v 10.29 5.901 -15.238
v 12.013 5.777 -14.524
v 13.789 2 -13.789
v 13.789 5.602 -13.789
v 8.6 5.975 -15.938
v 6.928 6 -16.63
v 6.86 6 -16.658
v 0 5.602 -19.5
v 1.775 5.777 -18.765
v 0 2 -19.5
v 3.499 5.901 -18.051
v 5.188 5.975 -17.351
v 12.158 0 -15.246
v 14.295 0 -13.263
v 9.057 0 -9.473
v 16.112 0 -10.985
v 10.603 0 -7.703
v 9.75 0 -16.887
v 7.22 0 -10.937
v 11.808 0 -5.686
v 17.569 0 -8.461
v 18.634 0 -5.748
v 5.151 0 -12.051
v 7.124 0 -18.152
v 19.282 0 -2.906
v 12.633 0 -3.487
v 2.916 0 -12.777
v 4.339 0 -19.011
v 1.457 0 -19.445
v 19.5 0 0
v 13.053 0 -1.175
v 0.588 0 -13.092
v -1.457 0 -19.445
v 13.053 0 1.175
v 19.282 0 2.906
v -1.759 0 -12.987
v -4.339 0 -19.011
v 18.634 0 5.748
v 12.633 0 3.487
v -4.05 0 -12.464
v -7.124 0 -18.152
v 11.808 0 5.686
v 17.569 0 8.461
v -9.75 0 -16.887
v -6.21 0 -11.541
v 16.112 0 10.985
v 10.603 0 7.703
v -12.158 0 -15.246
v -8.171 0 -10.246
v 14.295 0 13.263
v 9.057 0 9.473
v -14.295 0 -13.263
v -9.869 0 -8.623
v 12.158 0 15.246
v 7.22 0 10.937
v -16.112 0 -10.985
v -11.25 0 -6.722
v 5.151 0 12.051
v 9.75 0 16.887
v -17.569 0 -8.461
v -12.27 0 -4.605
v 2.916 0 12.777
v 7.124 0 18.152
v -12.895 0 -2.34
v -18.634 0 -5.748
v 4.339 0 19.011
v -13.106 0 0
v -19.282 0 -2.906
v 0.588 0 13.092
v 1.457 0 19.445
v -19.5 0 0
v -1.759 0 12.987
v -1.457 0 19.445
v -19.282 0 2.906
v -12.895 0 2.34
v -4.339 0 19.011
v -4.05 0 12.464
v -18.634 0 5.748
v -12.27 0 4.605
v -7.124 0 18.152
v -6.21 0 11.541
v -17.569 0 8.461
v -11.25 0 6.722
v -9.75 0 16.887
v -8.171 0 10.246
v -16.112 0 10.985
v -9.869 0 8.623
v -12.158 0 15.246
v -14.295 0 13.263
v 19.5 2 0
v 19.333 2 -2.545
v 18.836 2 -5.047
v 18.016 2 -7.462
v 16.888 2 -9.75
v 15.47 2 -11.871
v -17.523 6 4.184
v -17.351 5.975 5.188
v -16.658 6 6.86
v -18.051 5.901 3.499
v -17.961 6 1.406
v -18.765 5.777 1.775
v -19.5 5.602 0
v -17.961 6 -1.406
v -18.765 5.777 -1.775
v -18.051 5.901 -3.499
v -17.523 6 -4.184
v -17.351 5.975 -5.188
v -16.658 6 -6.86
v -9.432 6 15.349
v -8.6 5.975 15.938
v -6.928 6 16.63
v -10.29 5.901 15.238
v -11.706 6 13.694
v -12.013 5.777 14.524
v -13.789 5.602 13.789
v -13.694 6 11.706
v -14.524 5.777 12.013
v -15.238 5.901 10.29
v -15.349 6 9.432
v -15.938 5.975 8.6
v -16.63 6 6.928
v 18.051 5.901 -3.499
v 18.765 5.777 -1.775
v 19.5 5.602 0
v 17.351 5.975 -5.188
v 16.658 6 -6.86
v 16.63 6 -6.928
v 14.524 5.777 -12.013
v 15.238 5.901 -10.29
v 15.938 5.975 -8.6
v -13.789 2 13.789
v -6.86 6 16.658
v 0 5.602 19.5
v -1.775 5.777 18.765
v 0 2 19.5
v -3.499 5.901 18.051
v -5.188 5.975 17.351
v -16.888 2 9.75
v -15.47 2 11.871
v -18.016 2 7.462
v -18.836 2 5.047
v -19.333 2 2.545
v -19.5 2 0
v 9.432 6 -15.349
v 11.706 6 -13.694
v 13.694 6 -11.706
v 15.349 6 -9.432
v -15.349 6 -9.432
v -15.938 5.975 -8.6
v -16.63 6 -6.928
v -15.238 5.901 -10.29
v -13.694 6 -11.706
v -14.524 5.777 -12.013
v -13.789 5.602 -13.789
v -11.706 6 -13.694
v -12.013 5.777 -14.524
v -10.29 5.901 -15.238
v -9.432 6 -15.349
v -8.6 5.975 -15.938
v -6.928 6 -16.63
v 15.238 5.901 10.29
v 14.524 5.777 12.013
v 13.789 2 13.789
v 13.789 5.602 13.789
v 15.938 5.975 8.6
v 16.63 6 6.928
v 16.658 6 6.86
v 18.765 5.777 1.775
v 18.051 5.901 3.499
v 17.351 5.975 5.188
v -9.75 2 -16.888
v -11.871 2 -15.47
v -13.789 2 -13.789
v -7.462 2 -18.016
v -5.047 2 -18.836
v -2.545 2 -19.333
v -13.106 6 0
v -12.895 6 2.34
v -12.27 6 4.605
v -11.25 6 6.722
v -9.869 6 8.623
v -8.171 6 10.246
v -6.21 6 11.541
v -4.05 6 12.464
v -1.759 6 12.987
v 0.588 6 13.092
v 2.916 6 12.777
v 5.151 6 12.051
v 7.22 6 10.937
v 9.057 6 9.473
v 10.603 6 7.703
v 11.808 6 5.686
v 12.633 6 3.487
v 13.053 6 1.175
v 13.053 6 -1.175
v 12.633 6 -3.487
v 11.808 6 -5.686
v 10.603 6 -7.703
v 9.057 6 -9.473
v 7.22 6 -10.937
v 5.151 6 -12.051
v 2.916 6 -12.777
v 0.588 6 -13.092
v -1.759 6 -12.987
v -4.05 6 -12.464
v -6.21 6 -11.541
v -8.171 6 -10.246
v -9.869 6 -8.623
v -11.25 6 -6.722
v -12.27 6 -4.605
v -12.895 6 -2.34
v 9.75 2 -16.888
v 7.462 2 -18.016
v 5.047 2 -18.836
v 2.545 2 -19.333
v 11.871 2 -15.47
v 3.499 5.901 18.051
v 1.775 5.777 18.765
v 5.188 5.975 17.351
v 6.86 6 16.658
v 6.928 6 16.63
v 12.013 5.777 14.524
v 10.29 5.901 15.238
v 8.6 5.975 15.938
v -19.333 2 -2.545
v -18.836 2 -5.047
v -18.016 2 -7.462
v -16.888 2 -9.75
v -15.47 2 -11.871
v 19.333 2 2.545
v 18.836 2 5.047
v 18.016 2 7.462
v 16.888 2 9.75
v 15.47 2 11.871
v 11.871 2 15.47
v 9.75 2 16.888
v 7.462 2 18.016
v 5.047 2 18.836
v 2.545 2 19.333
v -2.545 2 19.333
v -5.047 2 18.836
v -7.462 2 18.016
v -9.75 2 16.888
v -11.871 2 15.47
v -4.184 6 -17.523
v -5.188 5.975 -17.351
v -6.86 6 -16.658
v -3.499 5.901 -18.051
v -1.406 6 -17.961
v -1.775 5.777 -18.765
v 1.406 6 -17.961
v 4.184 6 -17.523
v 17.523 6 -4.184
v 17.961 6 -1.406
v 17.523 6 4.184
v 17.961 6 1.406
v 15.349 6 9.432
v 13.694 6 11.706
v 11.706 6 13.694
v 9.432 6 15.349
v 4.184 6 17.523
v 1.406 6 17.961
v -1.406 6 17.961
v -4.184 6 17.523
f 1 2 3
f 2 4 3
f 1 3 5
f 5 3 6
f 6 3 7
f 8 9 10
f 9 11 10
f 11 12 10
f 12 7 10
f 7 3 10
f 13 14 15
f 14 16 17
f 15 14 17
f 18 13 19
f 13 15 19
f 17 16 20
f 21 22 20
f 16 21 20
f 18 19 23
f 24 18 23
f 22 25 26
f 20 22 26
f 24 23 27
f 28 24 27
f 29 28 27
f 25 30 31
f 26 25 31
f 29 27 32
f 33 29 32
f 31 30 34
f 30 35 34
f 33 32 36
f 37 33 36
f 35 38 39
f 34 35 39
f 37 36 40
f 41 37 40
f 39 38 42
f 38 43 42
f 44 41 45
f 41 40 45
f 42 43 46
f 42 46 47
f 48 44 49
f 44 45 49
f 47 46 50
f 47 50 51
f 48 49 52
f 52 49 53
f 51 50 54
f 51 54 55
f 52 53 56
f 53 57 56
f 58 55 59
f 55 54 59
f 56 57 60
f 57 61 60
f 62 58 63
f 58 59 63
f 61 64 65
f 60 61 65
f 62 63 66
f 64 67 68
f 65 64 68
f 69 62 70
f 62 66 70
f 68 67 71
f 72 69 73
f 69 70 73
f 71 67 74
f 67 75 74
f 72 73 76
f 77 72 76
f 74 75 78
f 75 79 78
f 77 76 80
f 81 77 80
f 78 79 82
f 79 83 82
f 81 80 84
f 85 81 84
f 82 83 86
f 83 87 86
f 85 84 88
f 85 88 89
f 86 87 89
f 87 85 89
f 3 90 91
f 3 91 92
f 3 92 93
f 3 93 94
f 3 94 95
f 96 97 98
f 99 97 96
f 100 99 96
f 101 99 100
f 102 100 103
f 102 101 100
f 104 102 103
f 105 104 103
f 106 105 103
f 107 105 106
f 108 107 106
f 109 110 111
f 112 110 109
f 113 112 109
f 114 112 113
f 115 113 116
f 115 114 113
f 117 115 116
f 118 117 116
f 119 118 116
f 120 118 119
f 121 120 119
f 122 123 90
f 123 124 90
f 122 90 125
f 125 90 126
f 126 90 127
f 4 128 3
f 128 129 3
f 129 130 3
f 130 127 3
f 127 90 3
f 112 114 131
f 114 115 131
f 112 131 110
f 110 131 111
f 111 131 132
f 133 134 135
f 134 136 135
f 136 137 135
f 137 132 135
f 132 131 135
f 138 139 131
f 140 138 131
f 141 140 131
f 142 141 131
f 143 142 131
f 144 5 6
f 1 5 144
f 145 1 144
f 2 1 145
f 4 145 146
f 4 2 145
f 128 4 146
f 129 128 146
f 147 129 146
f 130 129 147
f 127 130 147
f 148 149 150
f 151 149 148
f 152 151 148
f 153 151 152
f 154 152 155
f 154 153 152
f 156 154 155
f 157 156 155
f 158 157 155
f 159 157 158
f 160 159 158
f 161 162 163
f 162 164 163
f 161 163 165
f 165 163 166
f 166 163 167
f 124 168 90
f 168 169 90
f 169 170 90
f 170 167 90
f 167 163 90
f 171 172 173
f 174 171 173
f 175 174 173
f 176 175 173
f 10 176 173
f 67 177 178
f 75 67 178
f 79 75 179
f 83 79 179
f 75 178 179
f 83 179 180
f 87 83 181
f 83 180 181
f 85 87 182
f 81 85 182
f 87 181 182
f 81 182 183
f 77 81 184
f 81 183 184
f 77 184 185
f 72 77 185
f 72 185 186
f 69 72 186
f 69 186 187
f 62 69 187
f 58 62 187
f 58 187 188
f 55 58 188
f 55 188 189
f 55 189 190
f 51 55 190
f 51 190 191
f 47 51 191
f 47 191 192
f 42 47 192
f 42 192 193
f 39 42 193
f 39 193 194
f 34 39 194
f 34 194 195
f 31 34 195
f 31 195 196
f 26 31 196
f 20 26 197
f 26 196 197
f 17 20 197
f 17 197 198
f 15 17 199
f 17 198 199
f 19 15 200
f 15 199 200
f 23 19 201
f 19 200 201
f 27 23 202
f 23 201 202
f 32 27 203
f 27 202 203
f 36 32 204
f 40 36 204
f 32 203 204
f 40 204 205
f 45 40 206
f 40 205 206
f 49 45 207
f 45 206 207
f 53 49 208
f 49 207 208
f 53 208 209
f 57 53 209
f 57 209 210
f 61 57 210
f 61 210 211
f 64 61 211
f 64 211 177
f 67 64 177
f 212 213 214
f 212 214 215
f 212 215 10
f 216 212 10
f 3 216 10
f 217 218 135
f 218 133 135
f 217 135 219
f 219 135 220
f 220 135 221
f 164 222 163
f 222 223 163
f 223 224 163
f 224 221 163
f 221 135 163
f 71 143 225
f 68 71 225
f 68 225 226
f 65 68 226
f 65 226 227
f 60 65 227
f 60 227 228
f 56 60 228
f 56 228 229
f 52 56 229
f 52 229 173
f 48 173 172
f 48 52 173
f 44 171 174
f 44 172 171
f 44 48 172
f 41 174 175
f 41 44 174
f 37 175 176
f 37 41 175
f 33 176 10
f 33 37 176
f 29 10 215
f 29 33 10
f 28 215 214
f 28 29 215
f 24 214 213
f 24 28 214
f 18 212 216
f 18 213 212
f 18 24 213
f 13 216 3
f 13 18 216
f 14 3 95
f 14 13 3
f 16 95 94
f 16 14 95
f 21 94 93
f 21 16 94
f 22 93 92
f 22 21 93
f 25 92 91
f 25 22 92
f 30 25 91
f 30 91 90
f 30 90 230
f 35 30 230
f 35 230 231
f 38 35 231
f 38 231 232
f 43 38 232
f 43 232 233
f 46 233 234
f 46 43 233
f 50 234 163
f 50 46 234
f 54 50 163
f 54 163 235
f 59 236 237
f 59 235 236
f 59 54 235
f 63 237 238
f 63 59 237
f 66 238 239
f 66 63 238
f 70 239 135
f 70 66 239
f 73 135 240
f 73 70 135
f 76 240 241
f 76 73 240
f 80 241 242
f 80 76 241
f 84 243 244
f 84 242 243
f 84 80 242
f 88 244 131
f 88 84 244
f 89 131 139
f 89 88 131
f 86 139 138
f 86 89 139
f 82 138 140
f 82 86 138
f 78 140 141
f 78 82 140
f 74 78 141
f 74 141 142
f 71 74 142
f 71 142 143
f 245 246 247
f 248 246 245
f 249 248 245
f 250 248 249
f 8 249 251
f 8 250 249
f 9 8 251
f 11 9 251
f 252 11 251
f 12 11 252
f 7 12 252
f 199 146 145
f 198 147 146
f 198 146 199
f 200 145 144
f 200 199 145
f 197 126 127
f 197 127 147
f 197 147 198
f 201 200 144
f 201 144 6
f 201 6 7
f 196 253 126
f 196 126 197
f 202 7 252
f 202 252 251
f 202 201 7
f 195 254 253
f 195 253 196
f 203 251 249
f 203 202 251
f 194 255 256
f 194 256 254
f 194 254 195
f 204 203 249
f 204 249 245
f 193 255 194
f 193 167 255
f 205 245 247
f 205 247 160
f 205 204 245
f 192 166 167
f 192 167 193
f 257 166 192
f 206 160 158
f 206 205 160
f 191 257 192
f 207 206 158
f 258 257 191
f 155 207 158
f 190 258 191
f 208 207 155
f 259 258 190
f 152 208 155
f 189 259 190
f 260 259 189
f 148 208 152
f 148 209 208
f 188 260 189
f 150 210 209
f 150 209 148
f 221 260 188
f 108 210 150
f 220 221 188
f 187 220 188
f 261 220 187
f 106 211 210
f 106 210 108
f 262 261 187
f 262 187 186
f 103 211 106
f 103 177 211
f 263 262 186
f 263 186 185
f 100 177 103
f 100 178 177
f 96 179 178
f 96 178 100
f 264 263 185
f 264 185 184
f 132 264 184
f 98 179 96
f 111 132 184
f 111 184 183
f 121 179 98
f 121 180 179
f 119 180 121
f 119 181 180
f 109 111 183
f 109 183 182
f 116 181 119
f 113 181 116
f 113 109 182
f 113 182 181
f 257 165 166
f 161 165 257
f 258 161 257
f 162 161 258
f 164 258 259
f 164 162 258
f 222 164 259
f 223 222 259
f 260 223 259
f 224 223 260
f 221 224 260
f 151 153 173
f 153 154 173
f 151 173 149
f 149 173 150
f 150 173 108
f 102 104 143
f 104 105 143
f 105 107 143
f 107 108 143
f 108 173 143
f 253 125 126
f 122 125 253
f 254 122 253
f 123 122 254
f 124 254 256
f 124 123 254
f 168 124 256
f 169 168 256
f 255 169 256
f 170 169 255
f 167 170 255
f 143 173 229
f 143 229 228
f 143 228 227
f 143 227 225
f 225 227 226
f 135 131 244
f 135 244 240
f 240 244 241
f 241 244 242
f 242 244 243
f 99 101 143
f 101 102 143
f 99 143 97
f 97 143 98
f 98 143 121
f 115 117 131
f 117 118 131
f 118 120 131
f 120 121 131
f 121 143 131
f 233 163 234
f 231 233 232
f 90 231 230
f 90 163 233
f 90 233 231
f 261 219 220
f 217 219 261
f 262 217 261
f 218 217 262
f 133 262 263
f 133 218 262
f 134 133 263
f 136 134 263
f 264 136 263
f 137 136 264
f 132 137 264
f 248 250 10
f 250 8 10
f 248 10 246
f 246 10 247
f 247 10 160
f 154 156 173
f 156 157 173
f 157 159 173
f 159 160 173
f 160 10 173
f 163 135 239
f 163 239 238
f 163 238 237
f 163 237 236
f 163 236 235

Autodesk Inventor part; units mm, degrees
sketch "Sketch_1" plane through (0, 0, 0) normal (0, 0, 1) x (1, 0, 0)
  line L0 (0, 4) -> (0, 0)
  line L1 (-23.4, 4.5573) -> (-23.4, 2)
  line L2 (-23.4, 2) -> (-19.5, 2)
  line L3 (-19.5, 2) -> (-19.5, 0)
  line L4 (-19.5, 0) -> (-13.1055, 0)
  line L5 (-13.1055, 0) -> (-13.1055, 6)
  line L6 (-13.1055, 6) -> (-18.0157, 6)
  line L7 (-18.0157, 6) -> (-23.4, 4.5573)
revolve "Revolution1" add sketch "Sketch_1" angle 360 about axis through (0, 4, 0) along (0, 1, 0)
thread "Thread1" size "M30x3.5" class "6H" standard "ISO Metric profile" full length
sketch "Sketch_4" plane through (0, 2, 0) normal (0, 1, 0) x (1, 0, 0)
  circle A0 centre (0, 0) radius 50
  line L0 (-19.5, 0) -> (-13.7886, -13.7886)
  line L1 (-13.7886, -13.7886) -> (0, -19.5)
  line L2 (0, -19.5) -> (13.7886, -13.7886)
  line L3 (13.7886, -13.7886) -> (19.5, 0)
  line L4 (19.5, 0) -> (13.7886, 13.7886)
  line L5 (13.7886, 13.7886) -> (0, 19.5)
  line L6 (0, 19.5) -> (-13.7886, 13.7886)
  line L7 (-13.7886, 13.7886) -> (-19.5, 0)
extrude "Extrusion1" cut sketch "Sketch_4" along normal blind 4
ref_plane "nut_body_XY" through (0, 0, 0) normal (0, -1, 0) x (1, 0, 0)
ref_plane "nut_body_YZ" through (0, 0, 0) normal (1, 0, 0) x (0, 0, 1)
ref_plane "nut_body_ZX" through (0, 0, 0) normal (0, 0, 1) x (0, -1, 0)
properties part number "AP100_30_NUT"
